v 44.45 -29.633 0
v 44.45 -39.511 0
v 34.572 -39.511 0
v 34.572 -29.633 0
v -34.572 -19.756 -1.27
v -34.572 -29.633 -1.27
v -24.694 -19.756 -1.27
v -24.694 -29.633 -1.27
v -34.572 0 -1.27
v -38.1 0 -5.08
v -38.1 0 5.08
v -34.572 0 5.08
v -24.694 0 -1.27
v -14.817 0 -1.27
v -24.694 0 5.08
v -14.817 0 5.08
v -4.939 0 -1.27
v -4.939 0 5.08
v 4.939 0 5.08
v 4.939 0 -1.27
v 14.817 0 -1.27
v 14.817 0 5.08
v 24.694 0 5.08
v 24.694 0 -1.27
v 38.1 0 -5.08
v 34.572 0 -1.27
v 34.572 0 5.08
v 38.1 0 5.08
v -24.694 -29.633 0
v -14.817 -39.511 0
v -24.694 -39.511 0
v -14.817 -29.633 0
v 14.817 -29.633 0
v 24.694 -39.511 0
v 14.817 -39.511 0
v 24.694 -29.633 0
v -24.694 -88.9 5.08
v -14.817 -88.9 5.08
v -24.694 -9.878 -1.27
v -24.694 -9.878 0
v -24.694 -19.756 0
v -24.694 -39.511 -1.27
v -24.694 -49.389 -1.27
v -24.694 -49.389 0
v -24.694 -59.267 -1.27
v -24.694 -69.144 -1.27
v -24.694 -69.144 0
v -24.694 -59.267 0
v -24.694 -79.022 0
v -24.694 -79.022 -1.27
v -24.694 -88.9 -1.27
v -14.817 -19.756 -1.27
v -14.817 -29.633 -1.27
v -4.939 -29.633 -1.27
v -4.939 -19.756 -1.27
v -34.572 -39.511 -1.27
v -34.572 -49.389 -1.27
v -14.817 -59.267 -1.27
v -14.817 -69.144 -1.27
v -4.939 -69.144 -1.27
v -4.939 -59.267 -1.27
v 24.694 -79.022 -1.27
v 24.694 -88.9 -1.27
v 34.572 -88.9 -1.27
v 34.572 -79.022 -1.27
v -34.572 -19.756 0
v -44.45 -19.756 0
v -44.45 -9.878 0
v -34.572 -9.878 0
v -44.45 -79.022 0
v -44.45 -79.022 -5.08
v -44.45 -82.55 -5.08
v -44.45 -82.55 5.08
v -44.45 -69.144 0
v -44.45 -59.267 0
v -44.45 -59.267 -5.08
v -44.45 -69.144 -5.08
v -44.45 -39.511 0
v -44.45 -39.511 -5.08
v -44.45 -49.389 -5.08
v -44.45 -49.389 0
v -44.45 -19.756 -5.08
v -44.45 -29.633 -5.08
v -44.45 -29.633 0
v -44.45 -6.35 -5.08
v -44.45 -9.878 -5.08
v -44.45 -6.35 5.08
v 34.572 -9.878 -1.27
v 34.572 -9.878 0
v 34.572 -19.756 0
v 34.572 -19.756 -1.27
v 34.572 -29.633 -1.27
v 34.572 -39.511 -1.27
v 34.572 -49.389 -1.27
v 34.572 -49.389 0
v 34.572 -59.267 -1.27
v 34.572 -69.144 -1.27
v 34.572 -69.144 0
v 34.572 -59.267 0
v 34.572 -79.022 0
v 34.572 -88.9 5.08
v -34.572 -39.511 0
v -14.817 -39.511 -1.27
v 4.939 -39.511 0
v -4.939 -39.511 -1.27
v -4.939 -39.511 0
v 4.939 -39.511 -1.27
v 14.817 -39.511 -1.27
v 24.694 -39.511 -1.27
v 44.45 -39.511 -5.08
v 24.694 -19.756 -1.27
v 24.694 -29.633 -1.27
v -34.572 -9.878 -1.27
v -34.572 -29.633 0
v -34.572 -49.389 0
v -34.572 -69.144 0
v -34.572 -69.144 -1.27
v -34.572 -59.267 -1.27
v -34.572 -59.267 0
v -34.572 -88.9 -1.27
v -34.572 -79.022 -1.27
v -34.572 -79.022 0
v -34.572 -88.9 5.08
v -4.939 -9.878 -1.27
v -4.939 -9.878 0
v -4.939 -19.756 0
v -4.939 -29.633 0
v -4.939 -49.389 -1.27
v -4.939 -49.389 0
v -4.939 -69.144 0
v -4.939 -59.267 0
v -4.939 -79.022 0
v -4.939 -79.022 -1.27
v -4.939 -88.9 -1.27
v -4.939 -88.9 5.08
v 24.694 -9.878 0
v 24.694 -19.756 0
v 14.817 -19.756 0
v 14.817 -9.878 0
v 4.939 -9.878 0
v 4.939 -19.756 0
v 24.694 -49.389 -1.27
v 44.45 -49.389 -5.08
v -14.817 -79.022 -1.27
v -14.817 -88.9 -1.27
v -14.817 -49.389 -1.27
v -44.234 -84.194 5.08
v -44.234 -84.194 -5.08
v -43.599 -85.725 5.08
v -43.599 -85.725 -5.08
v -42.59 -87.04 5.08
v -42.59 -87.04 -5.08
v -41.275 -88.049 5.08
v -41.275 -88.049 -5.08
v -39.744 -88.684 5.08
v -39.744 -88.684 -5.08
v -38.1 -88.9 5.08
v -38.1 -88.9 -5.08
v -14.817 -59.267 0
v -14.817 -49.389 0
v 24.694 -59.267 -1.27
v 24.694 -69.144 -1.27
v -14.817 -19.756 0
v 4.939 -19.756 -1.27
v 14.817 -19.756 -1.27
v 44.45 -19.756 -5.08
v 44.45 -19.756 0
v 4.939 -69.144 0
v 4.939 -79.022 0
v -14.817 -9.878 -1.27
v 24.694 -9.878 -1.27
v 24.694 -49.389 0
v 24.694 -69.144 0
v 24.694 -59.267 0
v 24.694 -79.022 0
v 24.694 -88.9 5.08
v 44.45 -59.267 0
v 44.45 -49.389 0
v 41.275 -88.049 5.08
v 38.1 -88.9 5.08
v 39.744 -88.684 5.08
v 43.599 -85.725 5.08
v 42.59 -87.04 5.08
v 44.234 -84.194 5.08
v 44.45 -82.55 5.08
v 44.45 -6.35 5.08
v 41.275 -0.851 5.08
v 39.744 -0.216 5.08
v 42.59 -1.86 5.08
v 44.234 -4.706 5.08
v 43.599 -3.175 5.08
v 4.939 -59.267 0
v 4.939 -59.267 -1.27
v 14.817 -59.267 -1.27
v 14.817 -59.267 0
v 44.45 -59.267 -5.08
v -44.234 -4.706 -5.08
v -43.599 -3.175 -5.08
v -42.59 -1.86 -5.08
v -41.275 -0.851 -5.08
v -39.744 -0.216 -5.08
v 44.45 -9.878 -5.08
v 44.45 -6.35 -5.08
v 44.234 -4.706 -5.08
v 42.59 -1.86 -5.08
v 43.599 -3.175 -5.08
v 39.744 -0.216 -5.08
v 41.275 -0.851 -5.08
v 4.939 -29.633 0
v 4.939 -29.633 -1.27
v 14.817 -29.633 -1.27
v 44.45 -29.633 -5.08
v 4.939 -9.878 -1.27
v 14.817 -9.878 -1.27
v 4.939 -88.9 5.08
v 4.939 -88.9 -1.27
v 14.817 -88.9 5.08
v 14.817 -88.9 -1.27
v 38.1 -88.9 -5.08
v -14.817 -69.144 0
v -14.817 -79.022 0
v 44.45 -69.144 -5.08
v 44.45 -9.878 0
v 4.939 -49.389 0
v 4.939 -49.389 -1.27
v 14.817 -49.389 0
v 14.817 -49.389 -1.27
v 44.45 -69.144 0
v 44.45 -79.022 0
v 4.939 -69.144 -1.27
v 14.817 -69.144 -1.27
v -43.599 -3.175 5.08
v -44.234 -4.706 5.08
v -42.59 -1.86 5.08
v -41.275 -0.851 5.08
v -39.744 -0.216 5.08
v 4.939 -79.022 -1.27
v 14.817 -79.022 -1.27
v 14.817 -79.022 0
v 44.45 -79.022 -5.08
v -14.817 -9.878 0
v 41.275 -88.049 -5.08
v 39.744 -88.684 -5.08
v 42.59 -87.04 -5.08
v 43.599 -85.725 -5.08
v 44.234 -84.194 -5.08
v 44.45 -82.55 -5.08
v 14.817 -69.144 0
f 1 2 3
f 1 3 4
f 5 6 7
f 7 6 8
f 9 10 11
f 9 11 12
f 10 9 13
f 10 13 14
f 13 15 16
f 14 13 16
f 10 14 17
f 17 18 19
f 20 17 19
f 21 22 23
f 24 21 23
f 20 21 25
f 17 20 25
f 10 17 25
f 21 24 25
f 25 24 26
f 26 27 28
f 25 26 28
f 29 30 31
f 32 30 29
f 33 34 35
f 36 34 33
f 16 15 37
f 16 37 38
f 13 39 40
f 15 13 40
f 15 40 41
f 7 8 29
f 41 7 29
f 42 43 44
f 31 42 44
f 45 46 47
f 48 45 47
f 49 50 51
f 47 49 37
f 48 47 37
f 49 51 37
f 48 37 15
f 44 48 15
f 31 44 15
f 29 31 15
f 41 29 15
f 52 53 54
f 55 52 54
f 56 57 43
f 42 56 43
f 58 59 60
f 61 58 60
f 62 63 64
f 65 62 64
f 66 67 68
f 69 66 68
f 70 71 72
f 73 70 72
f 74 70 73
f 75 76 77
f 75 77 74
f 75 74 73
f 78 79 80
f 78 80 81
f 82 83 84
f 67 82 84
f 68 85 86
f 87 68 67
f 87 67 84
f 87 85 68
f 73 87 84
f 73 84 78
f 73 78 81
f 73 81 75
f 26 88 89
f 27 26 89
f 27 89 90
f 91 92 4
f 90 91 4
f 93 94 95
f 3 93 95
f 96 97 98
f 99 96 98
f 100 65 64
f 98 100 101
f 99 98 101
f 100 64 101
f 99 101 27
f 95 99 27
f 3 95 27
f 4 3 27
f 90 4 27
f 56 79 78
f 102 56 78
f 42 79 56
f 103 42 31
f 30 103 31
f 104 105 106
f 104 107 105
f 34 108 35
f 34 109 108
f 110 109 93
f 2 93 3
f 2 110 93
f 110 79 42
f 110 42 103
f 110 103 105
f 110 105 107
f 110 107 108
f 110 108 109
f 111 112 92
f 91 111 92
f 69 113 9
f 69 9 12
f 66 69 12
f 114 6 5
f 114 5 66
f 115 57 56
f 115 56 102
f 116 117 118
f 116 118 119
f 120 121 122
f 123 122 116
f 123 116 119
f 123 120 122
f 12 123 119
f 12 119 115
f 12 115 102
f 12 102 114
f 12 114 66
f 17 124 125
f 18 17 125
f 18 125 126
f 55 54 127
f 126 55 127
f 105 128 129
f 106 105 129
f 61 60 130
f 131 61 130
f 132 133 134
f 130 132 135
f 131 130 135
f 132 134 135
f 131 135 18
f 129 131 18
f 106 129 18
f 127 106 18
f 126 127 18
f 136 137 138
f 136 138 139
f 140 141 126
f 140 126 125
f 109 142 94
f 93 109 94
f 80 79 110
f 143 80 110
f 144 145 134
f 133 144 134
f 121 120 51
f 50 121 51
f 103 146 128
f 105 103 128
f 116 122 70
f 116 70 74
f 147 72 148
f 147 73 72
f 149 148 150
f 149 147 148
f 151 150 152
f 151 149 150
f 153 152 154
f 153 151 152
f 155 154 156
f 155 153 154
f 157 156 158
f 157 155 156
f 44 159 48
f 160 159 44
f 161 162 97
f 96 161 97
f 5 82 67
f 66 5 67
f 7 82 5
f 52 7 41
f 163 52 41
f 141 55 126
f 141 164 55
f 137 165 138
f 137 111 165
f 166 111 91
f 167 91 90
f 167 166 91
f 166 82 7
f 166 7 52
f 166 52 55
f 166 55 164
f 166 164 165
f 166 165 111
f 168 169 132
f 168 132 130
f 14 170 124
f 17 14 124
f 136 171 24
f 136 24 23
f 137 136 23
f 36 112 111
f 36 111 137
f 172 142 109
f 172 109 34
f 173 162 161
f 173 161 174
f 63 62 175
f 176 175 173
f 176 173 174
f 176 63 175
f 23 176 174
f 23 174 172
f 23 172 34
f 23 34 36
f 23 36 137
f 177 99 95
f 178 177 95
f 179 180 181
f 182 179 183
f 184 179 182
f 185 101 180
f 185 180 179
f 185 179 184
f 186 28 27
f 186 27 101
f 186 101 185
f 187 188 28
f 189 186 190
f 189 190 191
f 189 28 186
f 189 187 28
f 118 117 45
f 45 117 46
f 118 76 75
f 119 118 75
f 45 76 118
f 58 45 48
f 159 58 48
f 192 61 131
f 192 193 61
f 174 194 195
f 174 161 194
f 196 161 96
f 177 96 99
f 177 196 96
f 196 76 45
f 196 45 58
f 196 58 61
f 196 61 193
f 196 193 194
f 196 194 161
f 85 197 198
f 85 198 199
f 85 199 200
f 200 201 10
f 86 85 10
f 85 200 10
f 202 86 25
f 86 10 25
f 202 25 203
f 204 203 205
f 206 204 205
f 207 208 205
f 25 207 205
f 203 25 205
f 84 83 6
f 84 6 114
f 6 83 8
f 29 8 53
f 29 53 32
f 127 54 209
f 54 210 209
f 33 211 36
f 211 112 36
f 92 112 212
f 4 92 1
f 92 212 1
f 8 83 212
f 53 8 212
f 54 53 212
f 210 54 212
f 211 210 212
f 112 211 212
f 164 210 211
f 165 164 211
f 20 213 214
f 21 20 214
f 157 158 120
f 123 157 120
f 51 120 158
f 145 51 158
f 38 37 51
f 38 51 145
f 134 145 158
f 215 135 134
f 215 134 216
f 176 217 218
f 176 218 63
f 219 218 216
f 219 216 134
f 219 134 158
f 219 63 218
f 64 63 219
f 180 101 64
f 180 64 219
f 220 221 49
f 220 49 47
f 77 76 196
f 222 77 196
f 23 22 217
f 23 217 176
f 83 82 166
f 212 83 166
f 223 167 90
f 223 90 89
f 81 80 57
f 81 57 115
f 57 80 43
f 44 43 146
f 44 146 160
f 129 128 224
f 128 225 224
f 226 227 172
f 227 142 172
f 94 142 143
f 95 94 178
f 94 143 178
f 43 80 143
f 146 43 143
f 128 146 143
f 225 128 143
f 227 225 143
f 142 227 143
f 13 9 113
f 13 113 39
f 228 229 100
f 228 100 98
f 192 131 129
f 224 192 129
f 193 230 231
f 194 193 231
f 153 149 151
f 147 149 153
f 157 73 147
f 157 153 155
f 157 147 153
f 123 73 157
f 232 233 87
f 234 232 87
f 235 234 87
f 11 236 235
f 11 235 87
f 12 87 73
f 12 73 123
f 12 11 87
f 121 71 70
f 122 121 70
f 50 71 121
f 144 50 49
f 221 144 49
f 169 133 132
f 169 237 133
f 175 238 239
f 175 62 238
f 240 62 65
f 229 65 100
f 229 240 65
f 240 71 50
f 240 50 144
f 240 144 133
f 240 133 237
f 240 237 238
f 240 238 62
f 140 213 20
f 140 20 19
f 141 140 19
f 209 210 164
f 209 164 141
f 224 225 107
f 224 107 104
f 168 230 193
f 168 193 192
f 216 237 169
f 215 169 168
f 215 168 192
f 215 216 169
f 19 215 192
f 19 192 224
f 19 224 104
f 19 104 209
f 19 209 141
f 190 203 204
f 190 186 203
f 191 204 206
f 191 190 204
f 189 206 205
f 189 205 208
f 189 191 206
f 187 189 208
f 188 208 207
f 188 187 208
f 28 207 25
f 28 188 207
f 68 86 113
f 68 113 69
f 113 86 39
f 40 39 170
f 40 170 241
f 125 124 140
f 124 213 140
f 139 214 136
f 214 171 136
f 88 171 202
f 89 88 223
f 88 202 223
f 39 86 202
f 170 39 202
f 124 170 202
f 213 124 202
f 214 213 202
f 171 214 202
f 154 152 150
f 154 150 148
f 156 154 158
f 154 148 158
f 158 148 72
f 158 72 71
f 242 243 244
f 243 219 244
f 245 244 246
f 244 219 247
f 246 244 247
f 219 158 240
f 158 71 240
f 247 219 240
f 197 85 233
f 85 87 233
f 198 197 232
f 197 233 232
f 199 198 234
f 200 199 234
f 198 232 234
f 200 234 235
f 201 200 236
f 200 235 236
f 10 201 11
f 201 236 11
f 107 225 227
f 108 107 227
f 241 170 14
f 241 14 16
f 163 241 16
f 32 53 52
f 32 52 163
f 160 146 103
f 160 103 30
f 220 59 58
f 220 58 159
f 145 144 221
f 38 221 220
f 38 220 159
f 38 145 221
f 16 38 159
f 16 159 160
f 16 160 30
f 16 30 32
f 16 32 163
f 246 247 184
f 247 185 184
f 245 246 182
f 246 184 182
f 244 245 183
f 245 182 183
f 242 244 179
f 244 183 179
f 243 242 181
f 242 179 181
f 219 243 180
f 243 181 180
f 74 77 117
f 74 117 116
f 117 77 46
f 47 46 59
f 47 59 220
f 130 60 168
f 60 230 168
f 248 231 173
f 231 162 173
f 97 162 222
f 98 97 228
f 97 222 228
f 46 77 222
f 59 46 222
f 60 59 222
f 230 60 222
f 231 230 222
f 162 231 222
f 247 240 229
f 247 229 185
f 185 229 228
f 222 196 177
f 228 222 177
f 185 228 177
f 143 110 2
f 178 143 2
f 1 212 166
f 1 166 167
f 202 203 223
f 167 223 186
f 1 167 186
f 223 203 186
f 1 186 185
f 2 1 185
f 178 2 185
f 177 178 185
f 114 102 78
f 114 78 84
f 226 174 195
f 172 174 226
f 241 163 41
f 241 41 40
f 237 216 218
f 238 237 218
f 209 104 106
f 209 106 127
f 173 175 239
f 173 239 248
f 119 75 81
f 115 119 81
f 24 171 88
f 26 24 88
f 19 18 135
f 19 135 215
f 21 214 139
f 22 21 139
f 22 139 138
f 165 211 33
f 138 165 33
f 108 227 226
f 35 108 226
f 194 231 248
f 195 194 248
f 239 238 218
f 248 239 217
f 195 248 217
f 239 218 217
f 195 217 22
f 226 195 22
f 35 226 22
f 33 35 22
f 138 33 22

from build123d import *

# Parameters (mm, degrees)
F0_W     = 88.9
F0_H     = 10.16
F1_DEPTH = 88.9
F2_R     = 6.35
F3_W     = 9.877778
F3_H     = 6.35
F4_DEPTH = 88.901
F5_W     = 9.877778
F5_H     = 5.08
F6_DEPTH = 88.901


with BuildPart() as f1:
    # F0 (on Front) → F1 (new body)
    with BuildSketch(Plane.XZ):
        Rectangle(F0_W, F0_H)
    extrude(amount=F1_DEPTH)

    # F2
    f2_edges = [f1.edges().sort_by_distance(p)[0] for p in [
        (-44.45, -88.9, 0),
        (44.45, -88.9, 0),
        (44.45, 0, 0),
        (-44.45, 0, 0),
    ]]
    fillet(f2_edges, radius=F2_R)

    # F3 (on face) → F4 (cut, through all)
    with BuildSketch(Plane.XZ.offset(88.9)):
        with Locations((-29.633333, 1.905)):
            Rectangle(F3_W, F3_H)
        with Locations((-9.877778, 1.905)):
            Rectangle(F3_W, F3_H)
        with Locations((9.877778, 1.905)):
            Rectangle(F3_W, F3_H)
        with Locations((29.633333, 1.905)):
            Rectangle(F3_W, F3_H)
    extrude(amount=-F4_DEPTH, mode=Mode.SUBTRACT)

    # F5 (on face) → F6 (cut, through all)
    with BuildSketch(Plane.YZ.offset(44.45)):
        with Locations((-14.816667, -2.54)):
            Rectangle(F5_W, F5_H)
        with Locations((-34.572222, -2.54)):
            Rectangle(F5_W, F5_H)
        with Locations((-54.327778, -2.54)):
            Rectangle(F5_W, F5_H)
        with Locations((-74.083333, -2.54)):
            Rectangle(F5_W, F5_H)
    extrude(amount=-F6_DEPTH, mode=Mode.SUBTRACT)


solid = f1.part
